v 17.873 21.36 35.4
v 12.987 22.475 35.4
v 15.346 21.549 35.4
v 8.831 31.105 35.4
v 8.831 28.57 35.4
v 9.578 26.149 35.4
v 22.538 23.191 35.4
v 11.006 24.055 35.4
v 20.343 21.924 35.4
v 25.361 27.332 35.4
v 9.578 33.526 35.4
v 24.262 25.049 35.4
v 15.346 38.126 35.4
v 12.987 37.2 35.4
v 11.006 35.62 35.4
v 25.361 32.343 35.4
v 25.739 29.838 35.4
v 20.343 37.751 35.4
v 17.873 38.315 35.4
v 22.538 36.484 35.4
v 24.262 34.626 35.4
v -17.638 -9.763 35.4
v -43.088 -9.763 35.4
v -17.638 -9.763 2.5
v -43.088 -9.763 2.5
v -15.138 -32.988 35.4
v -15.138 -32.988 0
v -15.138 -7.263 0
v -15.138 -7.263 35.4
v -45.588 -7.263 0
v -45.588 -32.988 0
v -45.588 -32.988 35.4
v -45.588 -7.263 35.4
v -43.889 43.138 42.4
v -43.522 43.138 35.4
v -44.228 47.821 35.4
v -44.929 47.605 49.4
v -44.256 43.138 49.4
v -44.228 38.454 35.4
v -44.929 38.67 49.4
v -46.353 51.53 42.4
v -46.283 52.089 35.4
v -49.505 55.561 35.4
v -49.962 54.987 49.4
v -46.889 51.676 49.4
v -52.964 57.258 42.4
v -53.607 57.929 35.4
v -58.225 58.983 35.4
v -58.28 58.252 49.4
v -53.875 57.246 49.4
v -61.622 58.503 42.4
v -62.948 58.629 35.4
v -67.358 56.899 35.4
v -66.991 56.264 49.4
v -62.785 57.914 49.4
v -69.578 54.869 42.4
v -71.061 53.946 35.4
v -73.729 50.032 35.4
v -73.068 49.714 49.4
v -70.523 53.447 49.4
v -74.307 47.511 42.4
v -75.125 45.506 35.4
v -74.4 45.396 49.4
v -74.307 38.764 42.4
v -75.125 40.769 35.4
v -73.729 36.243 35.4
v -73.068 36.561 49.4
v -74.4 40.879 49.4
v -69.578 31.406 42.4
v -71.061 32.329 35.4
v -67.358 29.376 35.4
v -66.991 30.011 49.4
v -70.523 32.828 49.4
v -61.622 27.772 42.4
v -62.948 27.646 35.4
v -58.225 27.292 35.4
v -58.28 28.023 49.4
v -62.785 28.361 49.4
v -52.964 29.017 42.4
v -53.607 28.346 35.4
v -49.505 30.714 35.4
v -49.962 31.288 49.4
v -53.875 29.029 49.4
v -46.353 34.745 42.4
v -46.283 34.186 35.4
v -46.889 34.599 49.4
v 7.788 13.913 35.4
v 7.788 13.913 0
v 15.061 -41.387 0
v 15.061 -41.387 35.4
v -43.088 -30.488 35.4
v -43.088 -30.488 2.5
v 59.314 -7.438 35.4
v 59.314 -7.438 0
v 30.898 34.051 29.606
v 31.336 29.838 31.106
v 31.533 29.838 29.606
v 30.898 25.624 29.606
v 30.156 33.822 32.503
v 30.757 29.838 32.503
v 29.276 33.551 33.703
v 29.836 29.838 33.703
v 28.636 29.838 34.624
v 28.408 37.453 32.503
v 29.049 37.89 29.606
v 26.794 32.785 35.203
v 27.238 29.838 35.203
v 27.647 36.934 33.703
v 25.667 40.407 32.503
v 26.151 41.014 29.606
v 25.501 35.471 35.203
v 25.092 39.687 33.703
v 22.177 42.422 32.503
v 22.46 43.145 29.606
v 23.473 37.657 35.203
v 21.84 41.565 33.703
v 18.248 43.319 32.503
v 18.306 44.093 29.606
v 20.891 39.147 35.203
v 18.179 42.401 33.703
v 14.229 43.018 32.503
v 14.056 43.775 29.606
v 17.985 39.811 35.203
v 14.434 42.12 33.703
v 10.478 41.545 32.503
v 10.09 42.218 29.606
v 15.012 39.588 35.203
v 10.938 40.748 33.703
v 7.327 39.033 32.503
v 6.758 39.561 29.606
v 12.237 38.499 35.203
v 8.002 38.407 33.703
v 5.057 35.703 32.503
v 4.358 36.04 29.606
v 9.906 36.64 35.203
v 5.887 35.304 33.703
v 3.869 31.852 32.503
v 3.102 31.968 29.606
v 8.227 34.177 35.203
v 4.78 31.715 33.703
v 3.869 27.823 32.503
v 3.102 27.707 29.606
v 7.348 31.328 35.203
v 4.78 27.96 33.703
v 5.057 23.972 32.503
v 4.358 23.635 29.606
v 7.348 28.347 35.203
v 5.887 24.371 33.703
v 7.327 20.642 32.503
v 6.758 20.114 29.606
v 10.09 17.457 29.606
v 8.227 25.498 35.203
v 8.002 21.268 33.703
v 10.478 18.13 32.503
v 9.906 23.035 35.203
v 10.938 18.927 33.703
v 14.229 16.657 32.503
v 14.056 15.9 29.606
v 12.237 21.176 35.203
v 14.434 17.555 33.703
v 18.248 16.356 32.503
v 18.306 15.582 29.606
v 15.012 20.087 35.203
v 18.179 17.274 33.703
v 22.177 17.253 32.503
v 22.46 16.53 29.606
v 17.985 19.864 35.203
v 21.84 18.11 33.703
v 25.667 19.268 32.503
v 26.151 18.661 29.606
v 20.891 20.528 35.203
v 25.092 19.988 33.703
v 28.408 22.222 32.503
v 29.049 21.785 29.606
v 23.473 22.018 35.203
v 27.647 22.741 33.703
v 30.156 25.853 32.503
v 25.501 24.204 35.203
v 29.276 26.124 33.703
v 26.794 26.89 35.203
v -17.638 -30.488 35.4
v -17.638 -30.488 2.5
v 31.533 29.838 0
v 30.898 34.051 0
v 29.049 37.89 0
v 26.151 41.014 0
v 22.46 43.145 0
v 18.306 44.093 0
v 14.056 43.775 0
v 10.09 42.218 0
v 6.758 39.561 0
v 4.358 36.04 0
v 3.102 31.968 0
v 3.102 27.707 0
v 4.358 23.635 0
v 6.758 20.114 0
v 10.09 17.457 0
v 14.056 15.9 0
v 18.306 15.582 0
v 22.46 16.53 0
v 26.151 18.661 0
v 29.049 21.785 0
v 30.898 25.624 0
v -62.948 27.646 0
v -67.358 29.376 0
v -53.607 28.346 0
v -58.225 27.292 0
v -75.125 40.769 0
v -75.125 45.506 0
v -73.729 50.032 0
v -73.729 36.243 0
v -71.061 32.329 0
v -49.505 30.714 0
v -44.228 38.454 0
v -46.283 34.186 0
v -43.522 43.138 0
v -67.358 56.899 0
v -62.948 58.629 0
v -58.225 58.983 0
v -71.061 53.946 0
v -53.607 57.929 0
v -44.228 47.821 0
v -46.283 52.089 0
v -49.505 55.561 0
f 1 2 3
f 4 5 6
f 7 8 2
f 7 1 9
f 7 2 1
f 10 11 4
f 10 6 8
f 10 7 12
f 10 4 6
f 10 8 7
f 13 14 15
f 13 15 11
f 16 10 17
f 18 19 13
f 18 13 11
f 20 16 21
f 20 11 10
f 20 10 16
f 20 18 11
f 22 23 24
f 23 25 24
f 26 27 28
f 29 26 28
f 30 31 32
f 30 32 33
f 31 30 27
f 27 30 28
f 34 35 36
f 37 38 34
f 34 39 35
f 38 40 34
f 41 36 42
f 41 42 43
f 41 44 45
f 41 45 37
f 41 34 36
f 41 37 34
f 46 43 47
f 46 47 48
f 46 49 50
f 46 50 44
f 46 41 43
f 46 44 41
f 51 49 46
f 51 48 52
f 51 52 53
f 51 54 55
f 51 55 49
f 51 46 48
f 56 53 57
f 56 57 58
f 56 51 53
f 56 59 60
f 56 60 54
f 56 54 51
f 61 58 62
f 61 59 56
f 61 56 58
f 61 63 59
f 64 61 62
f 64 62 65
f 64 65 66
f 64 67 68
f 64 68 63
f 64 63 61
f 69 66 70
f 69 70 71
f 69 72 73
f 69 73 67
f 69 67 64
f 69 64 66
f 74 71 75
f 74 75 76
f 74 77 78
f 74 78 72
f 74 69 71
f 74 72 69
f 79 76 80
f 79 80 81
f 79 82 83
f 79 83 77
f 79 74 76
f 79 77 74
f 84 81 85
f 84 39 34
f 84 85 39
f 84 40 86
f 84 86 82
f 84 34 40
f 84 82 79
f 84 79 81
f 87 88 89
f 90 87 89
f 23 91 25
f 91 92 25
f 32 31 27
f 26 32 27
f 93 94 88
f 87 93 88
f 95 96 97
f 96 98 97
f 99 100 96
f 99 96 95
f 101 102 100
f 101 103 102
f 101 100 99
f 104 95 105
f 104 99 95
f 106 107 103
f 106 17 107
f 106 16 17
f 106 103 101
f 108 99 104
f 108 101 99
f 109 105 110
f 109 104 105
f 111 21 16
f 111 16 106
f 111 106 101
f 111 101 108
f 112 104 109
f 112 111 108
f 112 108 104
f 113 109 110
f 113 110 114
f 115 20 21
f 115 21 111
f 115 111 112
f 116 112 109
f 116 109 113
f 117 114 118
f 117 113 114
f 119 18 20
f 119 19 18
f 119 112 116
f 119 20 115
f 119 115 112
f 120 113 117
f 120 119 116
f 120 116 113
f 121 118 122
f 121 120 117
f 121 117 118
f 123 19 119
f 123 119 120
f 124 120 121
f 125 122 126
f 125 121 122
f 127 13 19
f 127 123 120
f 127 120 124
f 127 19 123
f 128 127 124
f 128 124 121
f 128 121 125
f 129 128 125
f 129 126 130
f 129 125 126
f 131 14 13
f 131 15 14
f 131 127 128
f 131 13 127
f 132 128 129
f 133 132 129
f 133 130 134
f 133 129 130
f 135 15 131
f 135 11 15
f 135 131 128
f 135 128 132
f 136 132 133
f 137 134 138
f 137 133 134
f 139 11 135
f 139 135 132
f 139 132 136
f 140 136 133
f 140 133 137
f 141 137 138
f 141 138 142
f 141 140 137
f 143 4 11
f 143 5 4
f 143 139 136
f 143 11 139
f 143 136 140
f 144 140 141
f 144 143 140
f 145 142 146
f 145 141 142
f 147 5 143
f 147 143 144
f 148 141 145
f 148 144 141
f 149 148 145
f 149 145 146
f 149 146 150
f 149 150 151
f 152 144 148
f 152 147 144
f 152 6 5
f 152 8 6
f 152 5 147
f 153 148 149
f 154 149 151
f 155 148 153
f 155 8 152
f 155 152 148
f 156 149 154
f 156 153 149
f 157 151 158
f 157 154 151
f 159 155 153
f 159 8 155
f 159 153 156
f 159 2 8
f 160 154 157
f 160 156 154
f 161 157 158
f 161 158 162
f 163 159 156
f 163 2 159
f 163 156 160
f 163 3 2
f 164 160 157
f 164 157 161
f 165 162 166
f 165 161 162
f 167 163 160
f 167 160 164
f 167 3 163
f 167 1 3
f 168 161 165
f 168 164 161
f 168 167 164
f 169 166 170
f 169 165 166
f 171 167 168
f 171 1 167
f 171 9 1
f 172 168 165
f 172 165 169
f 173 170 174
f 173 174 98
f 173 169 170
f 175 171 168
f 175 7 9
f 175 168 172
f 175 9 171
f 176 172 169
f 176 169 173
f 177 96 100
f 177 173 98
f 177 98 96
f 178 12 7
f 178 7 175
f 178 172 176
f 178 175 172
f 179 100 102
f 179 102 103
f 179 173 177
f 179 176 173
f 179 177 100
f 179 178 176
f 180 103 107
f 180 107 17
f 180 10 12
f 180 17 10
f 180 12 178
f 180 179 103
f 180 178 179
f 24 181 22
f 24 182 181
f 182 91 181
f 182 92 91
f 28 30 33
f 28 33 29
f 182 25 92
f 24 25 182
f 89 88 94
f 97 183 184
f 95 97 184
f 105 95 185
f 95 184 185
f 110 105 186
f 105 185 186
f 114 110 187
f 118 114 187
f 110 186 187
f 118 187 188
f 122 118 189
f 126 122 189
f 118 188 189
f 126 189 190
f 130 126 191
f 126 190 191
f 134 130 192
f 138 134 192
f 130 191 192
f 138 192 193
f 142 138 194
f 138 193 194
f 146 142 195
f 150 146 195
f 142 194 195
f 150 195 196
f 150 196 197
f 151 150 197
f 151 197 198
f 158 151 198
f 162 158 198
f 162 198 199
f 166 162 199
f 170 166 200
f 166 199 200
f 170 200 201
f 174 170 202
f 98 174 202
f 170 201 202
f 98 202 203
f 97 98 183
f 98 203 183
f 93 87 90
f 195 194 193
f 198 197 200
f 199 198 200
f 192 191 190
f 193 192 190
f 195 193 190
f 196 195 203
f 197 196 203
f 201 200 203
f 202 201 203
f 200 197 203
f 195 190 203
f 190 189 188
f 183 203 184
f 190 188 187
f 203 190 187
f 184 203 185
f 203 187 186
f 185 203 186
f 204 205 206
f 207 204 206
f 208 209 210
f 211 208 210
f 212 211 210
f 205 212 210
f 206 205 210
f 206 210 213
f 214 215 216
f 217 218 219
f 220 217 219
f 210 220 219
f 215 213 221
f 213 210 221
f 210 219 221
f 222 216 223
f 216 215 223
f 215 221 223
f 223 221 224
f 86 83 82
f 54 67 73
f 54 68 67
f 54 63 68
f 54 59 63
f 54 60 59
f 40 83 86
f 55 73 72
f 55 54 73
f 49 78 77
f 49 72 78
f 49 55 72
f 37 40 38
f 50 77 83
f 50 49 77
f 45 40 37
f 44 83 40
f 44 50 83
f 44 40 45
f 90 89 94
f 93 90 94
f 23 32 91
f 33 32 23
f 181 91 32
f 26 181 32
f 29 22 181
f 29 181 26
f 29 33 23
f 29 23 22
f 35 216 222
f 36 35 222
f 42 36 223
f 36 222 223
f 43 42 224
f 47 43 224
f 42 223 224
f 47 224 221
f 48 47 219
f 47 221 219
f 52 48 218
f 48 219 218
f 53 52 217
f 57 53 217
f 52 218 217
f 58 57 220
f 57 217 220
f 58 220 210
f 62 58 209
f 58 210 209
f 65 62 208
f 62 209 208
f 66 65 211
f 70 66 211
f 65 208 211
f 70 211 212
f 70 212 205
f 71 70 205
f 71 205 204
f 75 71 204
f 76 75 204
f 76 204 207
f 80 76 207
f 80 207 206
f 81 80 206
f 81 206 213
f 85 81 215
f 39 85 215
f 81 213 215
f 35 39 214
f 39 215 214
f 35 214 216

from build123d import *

# Parameters (mm, degrees)
F0_R     = 15.8903469299
F1_DEPTH = 35.4
F0_R_2   = 14.2954767942
F0_W     = 30.450001359
F0_H     = 25.7250014693
F2_R     = 15.8903469299
F3_DEPTH = 14
F3_TAPER = 3
F4_T     = -2.5
F5_R     = 5.7941125497


with BuildPart() as f1:
    # F0 (on Top) → F1 (new body)
    with BuildSketch(Plane.XY):
        with Locations((-59.4125017524, 43.1375019252)):
            Circle(F0_R)
    extrude(amount=F1_DEPTH)

    # F2 (on face) → F3 (join)
    with BuildSketch(Plane.XY.offset(35.4)):
        with Locations((-59.4125017524, 43.1375019252)):
            Circle(F2_R)
    extrude(amount=F3_DEPTH, taper=F3_TAPER)


with BuildPart() as f1b:
    # F0 (on Top) → F1, piece 2 (new body)
    with BuildSketch(Plane.XY):
        with Locations((17.2375012189, 29.837500304)):
            Circle(F0_R_2)
    extrude(amount=F1_DEPTH)

    # F5
    f5_edges = [f1b.edges().sort_by_distance(p)[0] for p in [
        (2.942024, 29.8375, 35.4),
    ]]
    fillet(f5_edges, radius=F5_R)


with BuildPart() as f1c:
    # F0 (on Top) → F1, piece 3 (new body)
    with BuildSketch(Plane.XY):
        with Locations((-30.3625017405, -20.1250007376)):
            Rectangle(F0_W, F0_H)
    extrude(amount=F1_DEPTH)

    # F4
    f4_openings = [f1c.faces().sort_by_distance(p)[0] for p in [
        (-30.362502, -20.125001, 35.4),
    ]]
    offset(amount=F4_T, openings=f4_openings)


with BuildPart() as f1d:
    # F0 (on Top) → F1, piece 4 (new body)
    with BuildSketch(Plane.XY):
        Polygon((15.0605507883, -41.3865997189), (59.314452788, -7.4384034879), (7.7875014395, 13.9125017449), align=None)
    extrude(amount=F1_DEPTH)


solid = Compound([f1.part, f1b.part, f1c.part, f1d.part])
